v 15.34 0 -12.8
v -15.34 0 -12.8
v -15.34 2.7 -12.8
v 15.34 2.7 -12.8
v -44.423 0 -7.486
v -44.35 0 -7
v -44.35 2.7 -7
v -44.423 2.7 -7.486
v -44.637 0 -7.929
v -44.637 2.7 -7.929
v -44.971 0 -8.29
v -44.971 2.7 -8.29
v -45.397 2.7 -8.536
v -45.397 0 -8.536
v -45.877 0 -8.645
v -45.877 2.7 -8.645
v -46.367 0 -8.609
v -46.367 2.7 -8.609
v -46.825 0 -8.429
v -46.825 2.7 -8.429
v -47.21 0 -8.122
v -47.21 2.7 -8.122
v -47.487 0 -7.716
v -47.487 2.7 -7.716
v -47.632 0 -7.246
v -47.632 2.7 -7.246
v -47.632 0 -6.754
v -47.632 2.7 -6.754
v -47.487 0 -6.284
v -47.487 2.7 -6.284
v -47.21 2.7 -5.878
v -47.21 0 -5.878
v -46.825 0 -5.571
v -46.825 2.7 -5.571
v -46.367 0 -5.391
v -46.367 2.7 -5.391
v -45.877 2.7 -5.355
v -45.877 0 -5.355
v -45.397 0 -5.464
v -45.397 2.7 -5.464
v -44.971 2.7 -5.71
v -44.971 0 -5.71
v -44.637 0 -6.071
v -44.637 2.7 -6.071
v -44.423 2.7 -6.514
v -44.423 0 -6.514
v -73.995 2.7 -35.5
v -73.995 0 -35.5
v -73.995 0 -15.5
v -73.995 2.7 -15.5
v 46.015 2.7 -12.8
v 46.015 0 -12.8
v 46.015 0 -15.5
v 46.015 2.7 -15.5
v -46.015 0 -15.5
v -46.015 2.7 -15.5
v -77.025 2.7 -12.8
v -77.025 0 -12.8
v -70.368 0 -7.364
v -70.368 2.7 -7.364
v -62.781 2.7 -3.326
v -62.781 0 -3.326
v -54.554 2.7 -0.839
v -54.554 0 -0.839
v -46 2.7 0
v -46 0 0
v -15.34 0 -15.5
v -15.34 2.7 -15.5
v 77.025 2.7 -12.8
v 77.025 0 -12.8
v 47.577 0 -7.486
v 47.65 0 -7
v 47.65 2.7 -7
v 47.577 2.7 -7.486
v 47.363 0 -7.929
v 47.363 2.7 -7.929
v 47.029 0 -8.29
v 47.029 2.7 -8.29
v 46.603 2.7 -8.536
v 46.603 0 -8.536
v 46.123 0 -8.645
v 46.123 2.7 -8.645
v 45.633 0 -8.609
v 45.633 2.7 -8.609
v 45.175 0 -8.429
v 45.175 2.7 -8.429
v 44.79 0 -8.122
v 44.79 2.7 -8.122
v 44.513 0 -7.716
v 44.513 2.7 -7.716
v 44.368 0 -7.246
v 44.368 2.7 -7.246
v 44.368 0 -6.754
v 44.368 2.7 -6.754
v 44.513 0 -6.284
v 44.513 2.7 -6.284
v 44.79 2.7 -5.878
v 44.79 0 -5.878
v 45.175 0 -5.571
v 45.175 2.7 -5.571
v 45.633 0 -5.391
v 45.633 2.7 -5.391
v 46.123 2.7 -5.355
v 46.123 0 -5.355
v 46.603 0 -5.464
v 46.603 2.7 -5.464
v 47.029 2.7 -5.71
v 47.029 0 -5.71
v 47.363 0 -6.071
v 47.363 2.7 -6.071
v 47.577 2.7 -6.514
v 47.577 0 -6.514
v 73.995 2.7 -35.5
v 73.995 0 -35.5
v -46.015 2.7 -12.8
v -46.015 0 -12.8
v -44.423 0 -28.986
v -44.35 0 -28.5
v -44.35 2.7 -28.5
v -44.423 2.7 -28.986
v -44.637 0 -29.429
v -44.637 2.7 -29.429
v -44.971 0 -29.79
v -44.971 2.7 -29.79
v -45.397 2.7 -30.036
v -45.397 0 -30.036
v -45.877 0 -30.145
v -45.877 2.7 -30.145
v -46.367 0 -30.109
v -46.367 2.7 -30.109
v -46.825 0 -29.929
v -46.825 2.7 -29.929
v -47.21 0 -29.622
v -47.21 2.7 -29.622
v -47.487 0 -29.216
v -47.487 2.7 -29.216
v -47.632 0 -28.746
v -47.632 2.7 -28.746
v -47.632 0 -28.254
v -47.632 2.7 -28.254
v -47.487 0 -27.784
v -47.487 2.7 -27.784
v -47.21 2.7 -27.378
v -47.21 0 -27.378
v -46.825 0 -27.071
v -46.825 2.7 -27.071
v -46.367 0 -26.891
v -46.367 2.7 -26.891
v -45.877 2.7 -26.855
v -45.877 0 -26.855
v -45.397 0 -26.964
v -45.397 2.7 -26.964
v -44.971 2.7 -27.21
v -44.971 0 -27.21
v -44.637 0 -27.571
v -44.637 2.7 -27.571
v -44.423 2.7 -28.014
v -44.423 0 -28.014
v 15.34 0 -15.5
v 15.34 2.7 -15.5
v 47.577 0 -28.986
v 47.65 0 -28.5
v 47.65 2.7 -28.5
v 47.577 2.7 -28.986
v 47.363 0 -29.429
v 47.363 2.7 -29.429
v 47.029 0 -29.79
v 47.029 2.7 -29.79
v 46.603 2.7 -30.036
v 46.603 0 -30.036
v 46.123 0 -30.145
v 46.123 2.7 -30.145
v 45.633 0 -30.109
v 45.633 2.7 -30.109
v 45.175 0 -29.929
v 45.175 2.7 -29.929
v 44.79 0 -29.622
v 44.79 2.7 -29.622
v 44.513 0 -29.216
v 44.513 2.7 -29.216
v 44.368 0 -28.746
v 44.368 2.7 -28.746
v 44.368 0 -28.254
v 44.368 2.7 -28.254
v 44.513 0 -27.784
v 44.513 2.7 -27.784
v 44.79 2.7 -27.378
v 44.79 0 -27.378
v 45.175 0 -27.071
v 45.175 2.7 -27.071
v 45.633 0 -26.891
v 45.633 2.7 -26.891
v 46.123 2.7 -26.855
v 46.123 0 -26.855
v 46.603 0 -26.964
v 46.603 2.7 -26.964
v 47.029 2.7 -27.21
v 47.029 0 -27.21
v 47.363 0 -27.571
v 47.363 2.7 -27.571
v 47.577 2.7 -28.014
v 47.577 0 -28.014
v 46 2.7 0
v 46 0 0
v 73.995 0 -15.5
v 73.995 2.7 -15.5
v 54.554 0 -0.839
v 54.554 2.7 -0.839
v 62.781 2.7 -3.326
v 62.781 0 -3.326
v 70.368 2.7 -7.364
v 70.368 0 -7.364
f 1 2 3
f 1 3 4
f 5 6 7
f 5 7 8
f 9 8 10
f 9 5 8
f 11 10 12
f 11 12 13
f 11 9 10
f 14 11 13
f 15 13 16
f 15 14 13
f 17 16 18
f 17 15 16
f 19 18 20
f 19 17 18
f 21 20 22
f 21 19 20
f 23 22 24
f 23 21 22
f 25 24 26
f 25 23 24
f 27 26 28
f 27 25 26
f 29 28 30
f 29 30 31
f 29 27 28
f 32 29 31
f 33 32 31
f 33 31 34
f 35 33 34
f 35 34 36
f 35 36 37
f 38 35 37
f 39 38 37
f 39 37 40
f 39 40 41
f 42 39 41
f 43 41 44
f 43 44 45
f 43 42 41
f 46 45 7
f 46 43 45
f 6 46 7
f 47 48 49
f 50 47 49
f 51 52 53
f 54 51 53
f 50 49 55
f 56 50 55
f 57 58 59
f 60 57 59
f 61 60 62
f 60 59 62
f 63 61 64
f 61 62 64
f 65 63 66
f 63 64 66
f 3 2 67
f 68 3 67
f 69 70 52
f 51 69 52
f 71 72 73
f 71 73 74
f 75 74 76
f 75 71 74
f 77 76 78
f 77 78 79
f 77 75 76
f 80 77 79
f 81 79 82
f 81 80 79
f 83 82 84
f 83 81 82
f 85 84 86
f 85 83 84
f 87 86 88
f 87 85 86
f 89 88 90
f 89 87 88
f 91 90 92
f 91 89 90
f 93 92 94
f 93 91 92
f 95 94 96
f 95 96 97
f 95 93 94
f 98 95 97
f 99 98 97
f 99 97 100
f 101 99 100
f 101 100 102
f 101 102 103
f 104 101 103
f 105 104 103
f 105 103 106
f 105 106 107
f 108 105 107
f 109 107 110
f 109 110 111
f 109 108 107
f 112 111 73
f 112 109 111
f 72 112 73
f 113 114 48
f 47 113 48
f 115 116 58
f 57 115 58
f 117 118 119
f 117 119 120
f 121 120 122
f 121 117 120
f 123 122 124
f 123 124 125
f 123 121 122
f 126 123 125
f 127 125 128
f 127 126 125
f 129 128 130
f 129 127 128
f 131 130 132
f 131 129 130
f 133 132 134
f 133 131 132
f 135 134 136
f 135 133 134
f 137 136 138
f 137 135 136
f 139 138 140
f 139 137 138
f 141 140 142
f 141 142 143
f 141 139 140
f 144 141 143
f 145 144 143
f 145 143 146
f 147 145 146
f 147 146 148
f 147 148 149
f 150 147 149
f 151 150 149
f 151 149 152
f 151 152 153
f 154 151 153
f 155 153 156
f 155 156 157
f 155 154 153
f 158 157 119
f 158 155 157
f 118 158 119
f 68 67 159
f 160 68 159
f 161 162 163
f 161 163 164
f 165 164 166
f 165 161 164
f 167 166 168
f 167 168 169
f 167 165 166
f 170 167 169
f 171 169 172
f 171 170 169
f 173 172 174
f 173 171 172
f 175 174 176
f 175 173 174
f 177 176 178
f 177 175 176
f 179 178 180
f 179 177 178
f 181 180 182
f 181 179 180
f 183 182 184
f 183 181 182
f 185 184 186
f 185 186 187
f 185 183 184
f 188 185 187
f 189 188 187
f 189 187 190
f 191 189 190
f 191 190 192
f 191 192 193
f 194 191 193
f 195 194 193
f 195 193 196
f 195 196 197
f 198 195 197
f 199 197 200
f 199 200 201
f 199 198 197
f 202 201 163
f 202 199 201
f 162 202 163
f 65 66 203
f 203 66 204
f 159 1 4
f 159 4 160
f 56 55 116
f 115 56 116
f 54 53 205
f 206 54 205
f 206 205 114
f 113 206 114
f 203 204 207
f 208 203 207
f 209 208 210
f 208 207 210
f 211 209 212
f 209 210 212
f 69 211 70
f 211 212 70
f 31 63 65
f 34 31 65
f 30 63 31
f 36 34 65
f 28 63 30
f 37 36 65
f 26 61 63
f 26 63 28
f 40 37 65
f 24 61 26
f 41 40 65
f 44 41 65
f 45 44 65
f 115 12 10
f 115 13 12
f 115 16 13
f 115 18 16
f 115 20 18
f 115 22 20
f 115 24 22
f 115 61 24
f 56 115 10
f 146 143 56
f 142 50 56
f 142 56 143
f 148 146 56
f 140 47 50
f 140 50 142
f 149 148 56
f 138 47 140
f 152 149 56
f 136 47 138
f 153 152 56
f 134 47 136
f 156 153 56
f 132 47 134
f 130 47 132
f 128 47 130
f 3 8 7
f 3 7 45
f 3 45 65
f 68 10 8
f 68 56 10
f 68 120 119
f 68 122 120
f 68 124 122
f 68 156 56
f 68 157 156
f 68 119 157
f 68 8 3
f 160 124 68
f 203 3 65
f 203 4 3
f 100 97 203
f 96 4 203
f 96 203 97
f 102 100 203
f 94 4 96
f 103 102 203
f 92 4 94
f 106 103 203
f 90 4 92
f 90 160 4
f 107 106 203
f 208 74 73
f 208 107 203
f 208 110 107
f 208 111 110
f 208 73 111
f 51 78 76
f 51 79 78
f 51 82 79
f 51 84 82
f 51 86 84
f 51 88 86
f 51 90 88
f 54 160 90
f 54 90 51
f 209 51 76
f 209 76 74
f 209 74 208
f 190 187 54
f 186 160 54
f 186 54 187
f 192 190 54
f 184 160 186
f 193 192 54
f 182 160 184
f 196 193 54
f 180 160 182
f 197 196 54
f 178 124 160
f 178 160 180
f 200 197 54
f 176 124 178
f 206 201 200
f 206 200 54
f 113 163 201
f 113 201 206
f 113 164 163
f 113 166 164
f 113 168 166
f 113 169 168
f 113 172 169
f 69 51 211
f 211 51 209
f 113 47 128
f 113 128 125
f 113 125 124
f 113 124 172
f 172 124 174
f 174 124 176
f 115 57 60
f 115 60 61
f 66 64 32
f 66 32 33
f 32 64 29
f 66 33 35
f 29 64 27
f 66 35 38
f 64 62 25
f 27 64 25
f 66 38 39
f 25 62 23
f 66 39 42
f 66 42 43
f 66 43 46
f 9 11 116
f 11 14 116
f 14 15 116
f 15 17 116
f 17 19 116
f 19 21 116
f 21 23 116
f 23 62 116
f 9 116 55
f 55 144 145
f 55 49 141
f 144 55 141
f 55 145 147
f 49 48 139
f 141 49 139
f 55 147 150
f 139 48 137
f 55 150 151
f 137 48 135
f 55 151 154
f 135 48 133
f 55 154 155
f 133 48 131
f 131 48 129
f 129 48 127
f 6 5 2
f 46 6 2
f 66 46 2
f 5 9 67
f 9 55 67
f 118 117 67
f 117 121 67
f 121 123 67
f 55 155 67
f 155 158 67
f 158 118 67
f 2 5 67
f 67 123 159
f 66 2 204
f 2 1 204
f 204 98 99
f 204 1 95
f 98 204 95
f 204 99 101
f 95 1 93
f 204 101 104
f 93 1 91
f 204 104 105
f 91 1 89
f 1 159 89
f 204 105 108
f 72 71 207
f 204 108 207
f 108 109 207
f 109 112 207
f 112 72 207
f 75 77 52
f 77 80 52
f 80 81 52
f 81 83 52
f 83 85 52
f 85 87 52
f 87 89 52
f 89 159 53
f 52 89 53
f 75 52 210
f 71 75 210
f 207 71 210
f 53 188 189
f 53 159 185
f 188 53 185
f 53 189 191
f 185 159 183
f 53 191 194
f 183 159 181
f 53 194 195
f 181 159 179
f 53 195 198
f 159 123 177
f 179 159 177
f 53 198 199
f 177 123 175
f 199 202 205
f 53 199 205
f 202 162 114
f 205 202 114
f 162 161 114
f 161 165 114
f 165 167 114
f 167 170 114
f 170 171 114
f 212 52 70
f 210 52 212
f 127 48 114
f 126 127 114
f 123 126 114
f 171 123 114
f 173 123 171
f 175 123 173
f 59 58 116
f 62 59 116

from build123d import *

# Parameters (mm, degrees)
SKETCH1_R           = 1.65
SKETCH1_W           = 30.68
SKETCH1_H           = 2.7
BOSS_EXTRUDE1_DEPTH = 2.7


with BuildPart() as part:
    # Sketch1 → Boss-Extrude1 (new body)
    with BuildSketch(Plane(origin=(0, 0, 0), x_dir=(1, 0, 0), z_dir=(0, 1, 0))):
        with BuildLine():
            Line((-46, 0), (46, 0))
            ThreePointArc((46, 0), (62.780941571, 3.32568378), (77.025151087, 12.8))
            Line((77.025151087, 12.8), (46.015151087, 12.8))
            Line((46.015151087, 12.8), (46.015151087, 15.5))
            Line((46.015151087, 15.5), (73.995151087, 15.5))
            Line((73.995151087, 15.5), (73.995151087, 35.5))
            Line((73.995151087, 35.5), (-73.995151087, 35.5))
            Line((-73.995151087, 35.5), (-73.995151087, 15.5))
            Line((-73.995151087, 15.5), (-46.015151087, 15.5))
            Line((-46.015151087, 15.5), (-46.015151087, 12.8))
            Line((-46.015151087, 12.8), (-77.025151087, 12.8))
            ThreePointArc((-77.025151087, 12.8), (-62.780941571, 3.32568378), (-46, 0))
        make_face()
        with Locations((46, 28.5)):
            Circle(SKETCH1_R, mode=Mode.SUBTRACT)
        with Locations((46, 7)):
            Circle(SKETCH1_R, mode=Mode.SUBTRACT)
        with Locations((-46, 7)):
            Circle(SKETCH1_R, mode=Mode.SUBTRACT)
        with Locations((-46, 28.5)):
            Circle(SKETCH1_R, mode=Mode.SUBTRACT)
        with Locations((0, 14.15)):
            Rectangle(SKETCH1_W, SKETCH1_H, mode=Mode.SUBTRACT)
    extrude(amount=BOSS_EXTRUDE1_DEPTH)


solid = part.part
